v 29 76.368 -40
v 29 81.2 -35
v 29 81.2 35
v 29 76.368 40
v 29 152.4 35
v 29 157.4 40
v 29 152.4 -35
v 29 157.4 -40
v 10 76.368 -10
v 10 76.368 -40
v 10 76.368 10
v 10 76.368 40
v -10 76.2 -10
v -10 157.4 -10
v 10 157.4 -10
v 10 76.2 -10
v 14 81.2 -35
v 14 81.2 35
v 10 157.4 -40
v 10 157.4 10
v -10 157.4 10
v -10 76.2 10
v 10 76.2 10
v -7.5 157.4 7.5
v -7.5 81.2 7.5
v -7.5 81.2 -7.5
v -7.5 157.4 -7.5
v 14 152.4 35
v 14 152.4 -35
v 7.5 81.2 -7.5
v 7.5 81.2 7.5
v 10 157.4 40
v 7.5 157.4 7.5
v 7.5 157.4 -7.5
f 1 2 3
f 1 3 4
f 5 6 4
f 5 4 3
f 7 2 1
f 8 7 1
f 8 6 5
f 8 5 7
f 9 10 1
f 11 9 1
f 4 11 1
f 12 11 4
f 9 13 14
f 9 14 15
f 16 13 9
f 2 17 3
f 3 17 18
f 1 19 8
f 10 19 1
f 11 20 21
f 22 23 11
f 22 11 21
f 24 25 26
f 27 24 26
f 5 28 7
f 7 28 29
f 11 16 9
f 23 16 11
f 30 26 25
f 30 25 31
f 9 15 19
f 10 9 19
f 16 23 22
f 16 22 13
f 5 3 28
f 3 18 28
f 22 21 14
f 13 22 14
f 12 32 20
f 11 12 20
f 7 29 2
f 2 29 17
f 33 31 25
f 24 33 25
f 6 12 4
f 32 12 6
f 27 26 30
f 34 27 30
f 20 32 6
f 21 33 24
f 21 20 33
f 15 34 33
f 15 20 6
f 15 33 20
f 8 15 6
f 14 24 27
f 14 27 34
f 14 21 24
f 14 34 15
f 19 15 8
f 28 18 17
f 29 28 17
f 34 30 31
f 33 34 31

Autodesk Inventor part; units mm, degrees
ref_plane "YZ Plane" through (0, 0, 0) normal (1, 0, 0) x (0, 1, 0)
ref_plane "XZ Plane" through (0, 0, 0) normal (0, 1, 0) x (-1, 0, 0)
ref_plane "XY Plane" through (0, 0, 0) normal (0, 0, 1) x (1, 0, 0)
sketch "Sketch1" plane through (0, 0, 0) normal (0, 1, 0) x (-1, 0, 0)
  line L0 (-7.25, 7.25) -> (7.25, 7.25)
  line L1 (7.25, 7.25) -> (7.25, -7.25)
  line L2 (7.25, -7.25) -> (-7.25, -7.25)
  line L3 (-7.25, -7.25) -> (-7.25, 7.25)
  line L4 (-7.25, 7.25) -> (7.25, -7.25) construction
  line L5 (7.25, 7.25) -> (-7.25, -7.25) construction
  point P0 (0, 0)
  dimension "d0" = 14.5
  dimension "d1" = 14.5
extrude "Extrusion1" add sketch "Sketch1" along normal blind 76.2
sketch "Sketch2" plane through (0, 76.2, 0) normal (0, 1, 0) x (1, 0, 0)
  line L0 (10, -10) -> (-10, -10)
  line L1 (-10, -10) -> (-10, 10)
  line L2 (-10, 10) -> (10, 10)
  line L3 (10, 10) -> (10, -10)
  line L4 (10, -10) -> (-10, 10) construction
  line L5 (-10, -10) -> (10, 10) construction
  point P0 (0, 0)
  dimension "d4" = 20
  dimension "d5" = 20
extrude "Extrusion2" add sketch "Sketch2" along normal blind 5
sketch "Sketch3" plane through (0, 81.2, 0) normal (0, 1, 0) x (1, 0, 0)
  line L0 (7.5, -7.5) -> (-7.5, -7.5)
  line L1 (-7.5, -7.5) -> (-7.5, 7.5)
  line L2 (-7.5, 7.5) -> (7.5, 7.5)
  line L3 (7.5, 7.5) -> (7.5, -7.5)
  line L4 (7.5, -7.5) -> (-7.5, 7.5) construction
  line L5 (-7.5, -7.5) -> (7.5, 7.5) construction
  line L6 (10, -10) -> (-10, -10)
  line L7 (-10, -10) -> (-10, 10)
  line L8 (-10, 10) -> (10, 10)
  line L9 (10, 10) -> (10, -10)
  line L10 (10, -10) -> (-10, 10) construction
  line L11 (-10, -10) -> (10, 10) construction
  point P0 (0, 0)
  dimension "d8" = 15
  dimension "d9" = 15
extrude "Extrusion3" add sketch "Sketch3" along normal blind 76.2
sketch "Sketch4" plane through (10, 76.2, 10) normal (1, 0, 0) x (0, 0, -1)
  line L0 (20, 0) -> (20, 81.2) projected
  line L1 (15, 81.2) -> (15, 0)
  line L2 (0, 0) -> (20, 0) projected
  line L3 (15, 81.2) -> (13, 81.2)
  line L4 (17.5, 81.2) -> (2.5, 81.2) projected
  line L5 (13, 81.2) -> (13, 0)
  line L6 (13, 0) -> (15, 0)
  line L7 (20, 81.2) -> (0, 81.2) projected
  point P0 (10, -76.2)
  dimension "d12" = 2
extrude "Extrusion4" add sketch "Sketch4" along normal blind 10 contours L2 L5 L3 L1
sketch "Sketch5" plane through (10, 76.2, -3) normal (0, 0, 1) x (1, 0, 0)
  line L0 (0, 81.2) -> (10, 81.2) projected
  line L1 (10, 81.2) -> (8, 81.2)
  line L2 (8, 81.2) -> (8, 0)
  line L3 (8, 0) -> (10, 0)
  line L4 (10, 0) -> (10, 81.2)
  point P0 (-10, -76.2)
  dimension "d15" = 2
extrude "Extrusion5" add sketch "Sketch5" along normal blind 8
sketch "Sketch6" plane through (20, 76.2, 10) normal (1, 0, 0) x (0, 0, -1)
  line L0 (5, 81.2) -> (3, 81.2)
  line L1 (3, 81.2) -> (3, 0)
  line L2 (3, 0) -> (5, 0)
  line L3 (5, 0) -> (5, 81.2)
  point P0 (10, -76.2)
  dimension "d18" = 2
extrude "Extrusion6" add sketch "Sketch6" against normal blind 4
sketch "Sketch7" plane through (0, 157.4, 0) normal (0, 1, 0) x (1, 0, 0)
  line L0 (18, 3) -> (18, -5)
  line L1 (18, 3) -> (18, -5) projected
  line L2 (18, -1) -> (10, -1)
  line L3 (10, 3) -> (10, -10) projected
  line L4 (10, -10) -> (10, -1)
  line L5 (10, 10) -> (10, -1)
  line L6 (10, 5) -> (20, 5)
  line L7 (10, 3) -> (18, 3)
  line L8 (10, 3) -> (18, 3) projected
  point P0 (0, 0)
sketch "Sketch8" plane through (0, 76.2, 0) normal (0, -1, 0) x (1, 0, 0)
  line L0 (16, 7) -> (16, 5)
  line L1 (16, 7) -> (16, 5) projected
  line L2 (18, 5) -> (18, -3)
  line L3 (18, -3) -> (18, 5) projected
  line L4 (16, 6) -> (16, 1)
  point P0 (0, 0)
  dimension "d21" = 5
sketch "Sketch9" plane through (7.25, 0, 7.25) normal (1, 0, 0) x (0, 0, -1)
  line L0 (0, 0) -> (14.5, 0)
  line L1 (14.5, 0) -> (14.5, 76.2)
  line L2 (14.5, 76.2) -> (0, 76.2)
  line L3 (0, 76.2) -> (0, 0)
  point P0 (7.25, 0)
extrude "Extrusion7" cut sketch "Sketch9" against normal through all
sketch "Sketch10" plane through (0, 76.2, 0) normal (0, -1, 0) x (1, 0, 0)
  line L0 (10, -5) -> (20, -5)
  line L1 (20, -5) -> (20, 7)
  line L2 (20, 7) -> (10, 7)
  line L3 (10, 7) -> (10, -5)
  point P0 (0, 0)
extrude "Extrusion8" cut sketch "Sketch10" against normal through all
sketch "Sketch11" plane through (10, 76.2, 10) normal (1, 0, 0) x (0, 0, -1)
  line L0 (20, 81.2) -> (50, 81.2)
  line L1 (0, 81.2) -> (-30, 81.2)
  line L2 (-30, 81.2) -> (50, 81.2)
  line L3 (50, 81.2) -> (50, 0.1684)
  line L4 (50, 0.1684) -> (-30, 0.1684)
  line L5 (-30, 0.1684) -> (-30, 81.2)
  point P0 (10, -76.2)
  dimension "d26" = 30
  dimension "d27" = 30
extrude "Extrusion9" add sketch "Sketch11" along normal blind 4
sketch "Sketch12" plane through (14, 76.2, 10) normal (1, 0, 0) x (0, 0, -1)
  line L0 (0, 81.2) -> (0, 76.2)
  line L1 (0, 0) -> (0, 81.2) projected
  line L2 (0, 66.0511) -> (-25, 66.0511)
  line L3 (-30, 81.2) -> (-30, 0.1684) projected
  line L4 (0, 25.128) -> (45, 25.128)
  line L5 (50, 0.1684) -> (50, 81.2) projected
  line L6 (31.5529, 0) -> (31.5529, 5)
  line L7 (-25, 76.2) -> (45, 76.2)
  line L8 (45, 76.2) -> (45, 5)
  line L9 (45, 5) -> (-25, 5)
  line L10 (-25, 5) -> (-25, 76.2)
  line L11 (-30, 81.2) -> (50, 81.2)
  line L12 (50, 81.2) -> (50, 0.1684)
  line L13 (50, 0.1684) -> (-30, 0.1684)
  line L14 (-30, 0.1684) -> (-30, 81.2)
  point P0 (10, -76.2)
  dimension "d30" = 5
  dimension "d31" = 25
  dimension "d32" = 45
  dimension "d33" = 5
extrude "Extrusion10" add sketch "Sketch12" along normal blind 15 contours L11 L5 L13 L6 L9 L8 L7 L0 | L0 L7 L10 L9 L1 L13 L3 L11 | L1 L9 L6 L13
properties part number "CouterWeightLink"
